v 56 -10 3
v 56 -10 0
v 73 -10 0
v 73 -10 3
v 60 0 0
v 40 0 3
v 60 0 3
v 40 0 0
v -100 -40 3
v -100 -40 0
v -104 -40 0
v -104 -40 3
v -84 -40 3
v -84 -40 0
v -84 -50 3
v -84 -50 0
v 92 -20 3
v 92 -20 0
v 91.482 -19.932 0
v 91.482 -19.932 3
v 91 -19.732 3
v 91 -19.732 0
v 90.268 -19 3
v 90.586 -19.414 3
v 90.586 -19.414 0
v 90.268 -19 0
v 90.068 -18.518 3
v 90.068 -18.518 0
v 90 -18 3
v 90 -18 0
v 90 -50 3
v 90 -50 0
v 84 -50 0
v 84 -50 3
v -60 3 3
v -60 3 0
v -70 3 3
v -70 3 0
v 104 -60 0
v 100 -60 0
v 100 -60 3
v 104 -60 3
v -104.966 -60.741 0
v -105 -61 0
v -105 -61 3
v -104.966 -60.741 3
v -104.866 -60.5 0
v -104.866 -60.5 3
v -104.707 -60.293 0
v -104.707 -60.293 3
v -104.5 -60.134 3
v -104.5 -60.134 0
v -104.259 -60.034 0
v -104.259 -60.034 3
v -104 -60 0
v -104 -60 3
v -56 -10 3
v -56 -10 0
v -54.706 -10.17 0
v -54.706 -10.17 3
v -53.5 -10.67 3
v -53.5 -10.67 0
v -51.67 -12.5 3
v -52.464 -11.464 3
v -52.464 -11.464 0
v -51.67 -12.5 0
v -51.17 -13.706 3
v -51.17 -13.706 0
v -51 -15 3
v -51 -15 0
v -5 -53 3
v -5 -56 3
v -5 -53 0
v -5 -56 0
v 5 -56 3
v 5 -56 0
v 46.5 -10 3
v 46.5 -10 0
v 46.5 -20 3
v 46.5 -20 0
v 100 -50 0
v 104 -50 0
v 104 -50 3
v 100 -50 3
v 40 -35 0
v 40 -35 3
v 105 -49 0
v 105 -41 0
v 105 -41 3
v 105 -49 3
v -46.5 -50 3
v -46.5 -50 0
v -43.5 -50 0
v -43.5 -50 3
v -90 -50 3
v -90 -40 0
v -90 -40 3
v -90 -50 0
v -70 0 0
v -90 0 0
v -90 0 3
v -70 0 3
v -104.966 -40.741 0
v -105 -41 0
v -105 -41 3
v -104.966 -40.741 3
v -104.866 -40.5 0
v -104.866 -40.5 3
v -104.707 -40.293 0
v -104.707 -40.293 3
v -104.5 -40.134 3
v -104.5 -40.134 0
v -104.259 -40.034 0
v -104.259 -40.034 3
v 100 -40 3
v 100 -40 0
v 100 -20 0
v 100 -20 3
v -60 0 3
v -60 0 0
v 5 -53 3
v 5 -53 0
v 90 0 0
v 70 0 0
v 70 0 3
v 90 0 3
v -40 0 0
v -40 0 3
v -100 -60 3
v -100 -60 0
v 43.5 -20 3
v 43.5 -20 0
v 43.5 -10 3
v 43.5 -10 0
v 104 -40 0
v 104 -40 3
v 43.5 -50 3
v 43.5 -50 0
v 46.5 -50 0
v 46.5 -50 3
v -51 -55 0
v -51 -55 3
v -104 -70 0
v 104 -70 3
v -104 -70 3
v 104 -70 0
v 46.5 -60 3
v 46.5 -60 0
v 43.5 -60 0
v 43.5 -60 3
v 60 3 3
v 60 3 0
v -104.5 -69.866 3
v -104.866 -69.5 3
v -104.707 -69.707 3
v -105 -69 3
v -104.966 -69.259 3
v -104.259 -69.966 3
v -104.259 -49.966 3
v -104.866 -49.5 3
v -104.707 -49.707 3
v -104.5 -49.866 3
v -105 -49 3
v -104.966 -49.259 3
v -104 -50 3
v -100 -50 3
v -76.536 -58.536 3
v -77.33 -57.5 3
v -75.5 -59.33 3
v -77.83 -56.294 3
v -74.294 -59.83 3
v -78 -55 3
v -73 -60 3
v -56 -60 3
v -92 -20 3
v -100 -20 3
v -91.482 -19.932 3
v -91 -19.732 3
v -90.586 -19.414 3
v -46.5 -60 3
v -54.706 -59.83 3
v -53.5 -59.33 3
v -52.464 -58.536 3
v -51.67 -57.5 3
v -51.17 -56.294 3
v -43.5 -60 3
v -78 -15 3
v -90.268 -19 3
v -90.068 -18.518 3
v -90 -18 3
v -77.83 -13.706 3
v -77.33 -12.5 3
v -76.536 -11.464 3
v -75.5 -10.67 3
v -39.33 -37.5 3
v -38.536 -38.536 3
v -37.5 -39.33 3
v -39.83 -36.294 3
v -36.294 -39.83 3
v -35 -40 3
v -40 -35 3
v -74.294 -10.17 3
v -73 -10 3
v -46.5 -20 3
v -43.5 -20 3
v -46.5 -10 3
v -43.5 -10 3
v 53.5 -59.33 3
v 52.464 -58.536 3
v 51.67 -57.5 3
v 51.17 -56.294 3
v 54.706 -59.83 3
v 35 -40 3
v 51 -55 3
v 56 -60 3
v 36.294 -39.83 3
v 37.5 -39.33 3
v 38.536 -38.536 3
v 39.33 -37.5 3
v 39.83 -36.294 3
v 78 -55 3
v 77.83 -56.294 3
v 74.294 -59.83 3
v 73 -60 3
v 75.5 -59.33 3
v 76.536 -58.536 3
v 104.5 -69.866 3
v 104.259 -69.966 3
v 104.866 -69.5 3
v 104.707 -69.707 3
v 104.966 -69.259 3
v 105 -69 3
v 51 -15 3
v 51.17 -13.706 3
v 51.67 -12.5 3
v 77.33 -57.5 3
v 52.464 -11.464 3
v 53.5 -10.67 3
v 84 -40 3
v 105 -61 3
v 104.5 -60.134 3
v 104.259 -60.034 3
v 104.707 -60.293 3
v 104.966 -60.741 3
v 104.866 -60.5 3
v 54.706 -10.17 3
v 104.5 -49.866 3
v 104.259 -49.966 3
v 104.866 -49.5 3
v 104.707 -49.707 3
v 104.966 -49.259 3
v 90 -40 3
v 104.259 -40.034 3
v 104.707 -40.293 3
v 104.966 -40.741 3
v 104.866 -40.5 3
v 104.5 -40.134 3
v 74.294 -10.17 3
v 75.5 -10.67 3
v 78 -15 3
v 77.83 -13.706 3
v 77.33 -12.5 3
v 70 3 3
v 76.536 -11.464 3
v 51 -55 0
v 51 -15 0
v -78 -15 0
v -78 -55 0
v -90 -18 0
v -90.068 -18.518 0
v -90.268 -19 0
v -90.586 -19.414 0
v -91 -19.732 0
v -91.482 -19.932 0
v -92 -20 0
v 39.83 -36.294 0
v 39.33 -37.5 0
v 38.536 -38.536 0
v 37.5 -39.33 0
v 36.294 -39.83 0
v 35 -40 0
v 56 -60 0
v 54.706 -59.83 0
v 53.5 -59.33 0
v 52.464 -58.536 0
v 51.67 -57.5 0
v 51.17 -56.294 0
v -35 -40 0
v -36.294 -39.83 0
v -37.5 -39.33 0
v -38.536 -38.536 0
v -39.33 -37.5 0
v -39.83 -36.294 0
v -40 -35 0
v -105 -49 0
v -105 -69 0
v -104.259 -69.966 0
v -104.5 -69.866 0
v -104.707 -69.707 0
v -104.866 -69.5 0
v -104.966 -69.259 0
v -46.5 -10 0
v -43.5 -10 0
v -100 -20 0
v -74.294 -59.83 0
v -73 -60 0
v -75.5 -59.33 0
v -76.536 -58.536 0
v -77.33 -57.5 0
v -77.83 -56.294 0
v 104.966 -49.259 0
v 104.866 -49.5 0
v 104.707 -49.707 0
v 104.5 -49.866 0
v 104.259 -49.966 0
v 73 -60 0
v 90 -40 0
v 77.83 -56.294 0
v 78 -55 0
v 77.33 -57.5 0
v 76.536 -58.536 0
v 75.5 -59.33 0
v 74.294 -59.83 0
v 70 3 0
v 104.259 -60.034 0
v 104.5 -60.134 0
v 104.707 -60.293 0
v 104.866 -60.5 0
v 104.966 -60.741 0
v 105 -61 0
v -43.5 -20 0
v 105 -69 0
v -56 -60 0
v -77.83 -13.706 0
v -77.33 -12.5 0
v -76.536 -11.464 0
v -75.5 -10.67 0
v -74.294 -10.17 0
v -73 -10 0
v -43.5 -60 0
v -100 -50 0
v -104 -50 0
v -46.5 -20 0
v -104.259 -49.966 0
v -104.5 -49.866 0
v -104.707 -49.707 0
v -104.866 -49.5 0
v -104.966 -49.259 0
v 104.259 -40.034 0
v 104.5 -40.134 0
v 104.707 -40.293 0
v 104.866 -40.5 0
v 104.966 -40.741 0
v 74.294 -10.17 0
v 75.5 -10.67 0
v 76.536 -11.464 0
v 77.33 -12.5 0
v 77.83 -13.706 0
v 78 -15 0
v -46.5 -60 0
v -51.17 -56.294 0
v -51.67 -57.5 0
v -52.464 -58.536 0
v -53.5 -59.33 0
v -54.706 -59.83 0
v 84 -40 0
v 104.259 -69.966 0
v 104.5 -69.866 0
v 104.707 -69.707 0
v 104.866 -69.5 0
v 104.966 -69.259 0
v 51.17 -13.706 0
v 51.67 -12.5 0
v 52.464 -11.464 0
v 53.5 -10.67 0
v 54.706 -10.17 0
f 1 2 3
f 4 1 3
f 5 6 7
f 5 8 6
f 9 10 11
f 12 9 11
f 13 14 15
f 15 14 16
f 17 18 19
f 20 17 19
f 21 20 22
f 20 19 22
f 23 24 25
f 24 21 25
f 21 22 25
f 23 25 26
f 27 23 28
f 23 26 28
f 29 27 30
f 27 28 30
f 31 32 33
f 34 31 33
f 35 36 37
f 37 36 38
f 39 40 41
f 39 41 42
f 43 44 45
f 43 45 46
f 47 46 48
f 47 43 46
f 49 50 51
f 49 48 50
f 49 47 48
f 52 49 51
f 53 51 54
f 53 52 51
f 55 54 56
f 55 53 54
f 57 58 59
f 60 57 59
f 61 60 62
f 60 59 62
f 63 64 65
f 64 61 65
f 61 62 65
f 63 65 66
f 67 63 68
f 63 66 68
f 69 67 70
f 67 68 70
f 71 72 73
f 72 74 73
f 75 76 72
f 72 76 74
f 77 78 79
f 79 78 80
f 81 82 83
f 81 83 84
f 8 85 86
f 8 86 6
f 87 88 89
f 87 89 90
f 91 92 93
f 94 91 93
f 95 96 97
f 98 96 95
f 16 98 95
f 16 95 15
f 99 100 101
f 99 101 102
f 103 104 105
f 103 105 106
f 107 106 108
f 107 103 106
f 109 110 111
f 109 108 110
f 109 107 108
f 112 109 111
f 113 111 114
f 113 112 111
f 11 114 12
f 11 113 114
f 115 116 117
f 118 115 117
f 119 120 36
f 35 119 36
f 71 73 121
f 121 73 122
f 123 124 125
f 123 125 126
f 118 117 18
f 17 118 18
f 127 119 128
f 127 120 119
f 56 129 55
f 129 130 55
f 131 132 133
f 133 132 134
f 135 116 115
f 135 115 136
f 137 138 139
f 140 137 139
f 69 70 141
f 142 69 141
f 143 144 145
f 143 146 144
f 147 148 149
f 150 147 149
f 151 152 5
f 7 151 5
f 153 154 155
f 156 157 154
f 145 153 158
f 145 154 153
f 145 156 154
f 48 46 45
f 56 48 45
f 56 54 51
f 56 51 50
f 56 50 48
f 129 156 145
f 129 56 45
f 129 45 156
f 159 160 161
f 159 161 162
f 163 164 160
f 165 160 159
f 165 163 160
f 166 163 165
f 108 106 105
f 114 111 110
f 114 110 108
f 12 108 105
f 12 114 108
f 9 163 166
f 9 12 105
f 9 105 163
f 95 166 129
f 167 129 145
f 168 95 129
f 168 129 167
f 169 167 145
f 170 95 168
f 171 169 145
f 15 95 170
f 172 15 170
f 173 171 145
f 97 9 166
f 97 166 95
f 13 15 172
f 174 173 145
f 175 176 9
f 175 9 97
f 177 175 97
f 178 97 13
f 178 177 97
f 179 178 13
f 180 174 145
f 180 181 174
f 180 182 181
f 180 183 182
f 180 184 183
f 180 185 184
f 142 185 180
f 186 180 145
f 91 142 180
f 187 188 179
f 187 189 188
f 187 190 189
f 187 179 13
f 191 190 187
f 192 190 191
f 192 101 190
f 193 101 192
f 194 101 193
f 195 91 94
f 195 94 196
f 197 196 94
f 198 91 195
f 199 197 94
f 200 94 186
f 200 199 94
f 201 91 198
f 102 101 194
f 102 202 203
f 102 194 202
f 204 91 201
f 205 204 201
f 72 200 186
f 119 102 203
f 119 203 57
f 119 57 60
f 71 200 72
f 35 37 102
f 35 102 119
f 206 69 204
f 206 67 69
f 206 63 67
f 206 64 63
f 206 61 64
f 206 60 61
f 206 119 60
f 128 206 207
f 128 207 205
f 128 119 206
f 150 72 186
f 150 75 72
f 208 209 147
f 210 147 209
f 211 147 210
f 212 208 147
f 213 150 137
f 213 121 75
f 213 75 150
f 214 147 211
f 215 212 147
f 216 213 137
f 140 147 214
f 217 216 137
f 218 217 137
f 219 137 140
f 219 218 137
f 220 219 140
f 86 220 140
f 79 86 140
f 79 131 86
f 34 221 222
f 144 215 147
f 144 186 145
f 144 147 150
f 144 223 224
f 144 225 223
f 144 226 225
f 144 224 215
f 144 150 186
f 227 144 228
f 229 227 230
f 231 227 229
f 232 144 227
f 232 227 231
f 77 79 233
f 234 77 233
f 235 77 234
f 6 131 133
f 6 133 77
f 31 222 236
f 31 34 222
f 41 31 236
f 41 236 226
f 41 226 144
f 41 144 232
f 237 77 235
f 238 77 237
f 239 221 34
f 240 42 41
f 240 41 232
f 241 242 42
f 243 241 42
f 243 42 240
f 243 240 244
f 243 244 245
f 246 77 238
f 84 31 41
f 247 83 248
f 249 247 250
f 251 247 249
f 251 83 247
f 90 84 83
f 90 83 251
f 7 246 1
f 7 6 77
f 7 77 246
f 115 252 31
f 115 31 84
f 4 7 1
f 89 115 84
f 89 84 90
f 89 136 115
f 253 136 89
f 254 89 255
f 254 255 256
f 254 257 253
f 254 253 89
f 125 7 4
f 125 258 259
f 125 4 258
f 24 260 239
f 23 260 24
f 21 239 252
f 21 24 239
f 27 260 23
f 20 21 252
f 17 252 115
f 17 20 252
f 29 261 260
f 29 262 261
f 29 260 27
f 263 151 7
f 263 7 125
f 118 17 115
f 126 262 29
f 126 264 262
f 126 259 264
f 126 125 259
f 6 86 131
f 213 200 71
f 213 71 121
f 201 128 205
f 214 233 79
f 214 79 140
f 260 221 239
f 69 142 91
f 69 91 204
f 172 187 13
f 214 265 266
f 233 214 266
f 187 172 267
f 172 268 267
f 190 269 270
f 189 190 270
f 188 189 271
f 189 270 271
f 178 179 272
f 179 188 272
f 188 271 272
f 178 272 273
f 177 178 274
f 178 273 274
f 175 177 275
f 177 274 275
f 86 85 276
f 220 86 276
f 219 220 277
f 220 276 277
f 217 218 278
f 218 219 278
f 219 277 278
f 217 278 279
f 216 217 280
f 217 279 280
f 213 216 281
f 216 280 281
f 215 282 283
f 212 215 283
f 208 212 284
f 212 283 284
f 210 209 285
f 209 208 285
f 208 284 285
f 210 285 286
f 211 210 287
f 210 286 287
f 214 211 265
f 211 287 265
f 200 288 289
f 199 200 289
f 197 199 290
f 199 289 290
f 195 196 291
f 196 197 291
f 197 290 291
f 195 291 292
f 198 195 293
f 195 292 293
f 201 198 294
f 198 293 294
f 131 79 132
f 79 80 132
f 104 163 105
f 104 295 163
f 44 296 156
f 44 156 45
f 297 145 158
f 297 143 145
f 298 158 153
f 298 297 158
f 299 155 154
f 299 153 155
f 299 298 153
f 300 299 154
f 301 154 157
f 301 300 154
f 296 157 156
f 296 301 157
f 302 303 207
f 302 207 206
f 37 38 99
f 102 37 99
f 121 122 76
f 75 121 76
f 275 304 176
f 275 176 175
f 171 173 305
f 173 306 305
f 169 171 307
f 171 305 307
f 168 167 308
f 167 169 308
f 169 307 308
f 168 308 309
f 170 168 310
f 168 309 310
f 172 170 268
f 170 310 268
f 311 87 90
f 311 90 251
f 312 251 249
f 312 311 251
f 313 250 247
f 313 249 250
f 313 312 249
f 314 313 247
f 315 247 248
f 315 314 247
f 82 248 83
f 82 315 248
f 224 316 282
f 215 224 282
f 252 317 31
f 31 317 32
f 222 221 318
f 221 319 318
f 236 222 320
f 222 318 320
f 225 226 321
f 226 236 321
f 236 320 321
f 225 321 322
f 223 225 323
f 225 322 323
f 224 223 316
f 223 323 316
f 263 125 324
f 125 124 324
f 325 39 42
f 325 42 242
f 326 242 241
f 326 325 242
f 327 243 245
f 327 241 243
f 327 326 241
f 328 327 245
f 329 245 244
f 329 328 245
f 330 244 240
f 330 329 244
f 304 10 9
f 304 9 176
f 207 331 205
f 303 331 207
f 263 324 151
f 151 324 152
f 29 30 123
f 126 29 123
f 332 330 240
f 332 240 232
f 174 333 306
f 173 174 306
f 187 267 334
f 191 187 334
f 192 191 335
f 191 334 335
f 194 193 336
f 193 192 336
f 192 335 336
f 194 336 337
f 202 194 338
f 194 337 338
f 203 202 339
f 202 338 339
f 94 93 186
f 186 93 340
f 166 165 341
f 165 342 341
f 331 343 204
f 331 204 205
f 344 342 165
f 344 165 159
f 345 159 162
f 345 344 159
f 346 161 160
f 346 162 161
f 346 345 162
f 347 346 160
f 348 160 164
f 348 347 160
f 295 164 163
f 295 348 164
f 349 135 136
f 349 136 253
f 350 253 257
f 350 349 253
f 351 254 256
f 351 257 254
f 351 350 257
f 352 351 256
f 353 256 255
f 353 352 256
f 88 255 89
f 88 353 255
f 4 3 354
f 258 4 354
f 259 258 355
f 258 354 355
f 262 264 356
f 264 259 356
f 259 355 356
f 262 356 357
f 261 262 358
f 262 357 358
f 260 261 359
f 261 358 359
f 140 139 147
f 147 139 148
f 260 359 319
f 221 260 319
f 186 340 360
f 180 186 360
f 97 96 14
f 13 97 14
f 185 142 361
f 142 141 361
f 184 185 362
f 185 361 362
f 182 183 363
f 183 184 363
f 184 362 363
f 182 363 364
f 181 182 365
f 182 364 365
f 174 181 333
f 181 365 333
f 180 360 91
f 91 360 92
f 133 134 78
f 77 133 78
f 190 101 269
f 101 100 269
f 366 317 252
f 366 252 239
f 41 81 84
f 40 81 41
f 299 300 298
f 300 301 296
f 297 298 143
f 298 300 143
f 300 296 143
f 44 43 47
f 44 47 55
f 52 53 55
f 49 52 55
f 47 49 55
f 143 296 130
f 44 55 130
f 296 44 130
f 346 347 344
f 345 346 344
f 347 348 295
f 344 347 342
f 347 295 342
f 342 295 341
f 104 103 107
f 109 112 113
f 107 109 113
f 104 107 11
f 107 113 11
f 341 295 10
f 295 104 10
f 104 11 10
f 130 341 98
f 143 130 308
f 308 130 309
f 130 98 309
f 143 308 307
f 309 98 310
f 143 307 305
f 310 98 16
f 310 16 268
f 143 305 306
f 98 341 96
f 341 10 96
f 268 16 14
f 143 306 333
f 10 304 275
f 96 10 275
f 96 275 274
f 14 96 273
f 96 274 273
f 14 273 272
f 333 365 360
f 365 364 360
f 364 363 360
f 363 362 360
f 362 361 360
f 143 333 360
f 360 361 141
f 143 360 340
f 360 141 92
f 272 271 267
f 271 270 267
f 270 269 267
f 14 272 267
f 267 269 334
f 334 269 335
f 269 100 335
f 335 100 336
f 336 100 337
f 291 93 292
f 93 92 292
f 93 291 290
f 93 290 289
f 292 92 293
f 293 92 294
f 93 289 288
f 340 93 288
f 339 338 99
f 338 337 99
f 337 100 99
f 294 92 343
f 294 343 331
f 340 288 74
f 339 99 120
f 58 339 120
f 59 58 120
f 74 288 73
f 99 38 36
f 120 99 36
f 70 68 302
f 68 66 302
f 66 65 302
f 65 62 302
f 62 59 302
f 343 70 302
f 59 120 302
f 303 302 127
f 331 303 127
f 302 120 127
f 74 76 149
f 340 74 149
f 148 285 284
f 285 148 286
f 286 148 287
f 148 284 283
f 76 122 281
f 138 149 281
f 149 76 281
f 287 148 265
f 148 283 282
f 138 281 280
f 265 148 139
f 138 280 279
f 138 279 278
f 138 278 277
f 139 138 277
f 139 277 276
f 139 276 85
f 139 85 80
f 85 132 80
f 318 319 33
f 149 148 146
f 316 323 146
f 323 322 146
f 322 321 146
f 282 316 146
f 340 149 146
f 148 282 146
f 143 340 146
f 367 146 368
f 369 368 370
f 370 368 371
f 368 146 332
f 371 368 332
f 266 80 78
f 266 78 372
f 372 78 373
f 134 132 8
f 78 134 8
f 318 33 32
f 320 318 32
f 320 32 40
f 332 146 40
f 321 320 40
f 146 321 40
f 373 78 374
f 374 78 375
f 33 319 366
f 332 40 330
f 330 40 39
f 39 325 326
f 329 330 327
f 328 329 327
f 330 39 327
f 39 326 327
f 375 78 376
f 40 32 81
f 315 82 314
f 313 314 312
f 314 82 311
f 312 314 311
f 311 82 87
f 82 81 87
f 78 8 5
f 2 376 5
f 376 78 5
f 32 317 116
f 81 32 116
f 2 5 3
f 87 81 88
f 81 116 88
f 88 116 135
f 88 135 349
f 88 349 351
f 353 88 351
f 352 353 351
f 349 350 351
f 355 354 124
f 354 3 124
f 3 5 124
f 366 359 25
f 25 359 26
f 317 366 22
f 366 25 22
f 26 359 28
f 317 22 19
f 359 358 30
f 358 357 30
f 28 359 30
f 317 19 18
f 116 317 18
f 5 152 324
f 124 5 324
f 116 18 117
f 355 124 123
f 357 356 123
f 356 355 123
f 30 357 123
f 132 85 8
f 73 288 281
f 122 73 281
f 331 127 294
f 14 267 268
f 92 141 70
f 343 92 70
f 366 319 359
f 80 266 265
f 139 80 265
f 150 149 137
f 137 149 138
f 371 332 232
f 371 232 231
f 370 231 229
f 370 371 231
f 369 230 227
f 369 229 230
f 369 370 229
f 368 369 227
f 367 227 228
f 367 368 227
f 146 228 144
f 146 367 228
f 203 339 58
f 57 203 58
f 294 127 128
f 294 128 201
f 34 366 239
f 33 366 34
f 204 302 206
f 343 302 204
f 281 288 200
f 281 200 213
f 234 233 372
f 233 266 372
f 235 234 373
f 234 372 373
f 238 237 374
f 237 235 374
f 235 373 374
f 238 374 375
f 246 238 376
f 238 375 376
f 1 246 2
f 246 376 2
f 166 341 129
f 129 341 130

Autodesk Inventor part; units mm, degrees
ref_plane "YZ Plane" through (0, 0, 0) normal (1, 0, 0) x (0, 1, 0)
ref_plane "XZ Plane" through (0, 0, 0) normal (0, 1, 0) x (-1, 0, 0)
ref_plane "XY Plane" through (0, 0, 0) normal (0, 0, 1) x (1, 0, 0)
sketch "Sketch1" plane through (0, 0, 0) normal (0, 0, 1) x (1, 0, 0)
  line L0 (-40, 0) -> (-40, -35)
  line L1 (-35, -40) -> (35, -40)
  line L2 (40, -35) -> (40, 0)
  line L3 (104, -70) -> (-104, -70)
  line L4 (-60, 0) -> (-60, 3)
  line L5 (-60, 3) -> (-70, 3)
  line L6 (-70, 3) -> (-70, 0)
  line L7 (-90, 0) -> (-70, 0)
  line L8 (-60, 0) -> (-40, 0)
  line L9 (70, 0) -> (70, 3)
  line L10 (70, 3) -> (60, 3)
  line L11 (60, 3) -> (60, 0)
  line L12 (40, 0) -> (60, 0)
  line L13 (70, 0) -> (90, 0)
  arc A0 (-105, -69) -> (-104, -70) centre (-104, -69) ccw
  arc A1 (104, -70) -> (105, -69) centre (104, -69) ccw
  line L14 (-90, -40) -> (-84, -40)
  line L15 (-84, -40) -> (-84, -50)
  line L16 (90, -40) -> (84, -40)
  line L17 (84, -40) -> (84, -50)
  line L18 (-43.5, -10) -> (-46.5, -10)
  line L19 (-46.5, -10) -> (-46.5, -20)
  line L20 (-46.5, -20) -> (-43.5, -20)
  line L21 (-43.5, -20) -> (-43.5, -10)
  line L22 (43.5, -10) -> (46.5, -10)
  line L23 (46.5, -10) -> (46.5, -20)
  line L24 (46.5, -20) -> (43.5, -20)
  line L25 (43.5, -20) -> (43.5, -10)
  line L26 (-46.5, -50) -> (-43.5, -50)
  line L27 (-43.5, -50) -> (-43.5, -60)
  line L28 (-43.5, -60) -> (-46.5, -60)
  line L29 (-46.5, -60) -> (-46.5, -50)
  line L30 (43.5, -50) -> (46.5, -50)
  line L31 (46.5, -50) -> (46.5, -60)
  line L32 (46.5, -60) -> (43.5, -60)
  line L33 (43.5, -60) -> (43.5, -50)
  line L34 (-5, -53) -> (5, -53)
  line L35 (5, -53) -> (5, -56)
  line L36 (5, -56) -> (-5, -56)
  line L37 (-5, -56) -> (-5, -53)
  line L38 (-100, -40) -> (-100, -20)
  line L39 (-100, -20) -> (-92, -20)
  line L40 (-90, -40) -> (-90, -50)
  line L41 (90, -40) -> (90, -50)
  line L42 (90, -50) -> (84, -50)
  line L43 (100, -40) -> (100, -20)
  line L44 (100, -20) -> (92, -20)
  line L45 (90, -18) -> (90, 0)
  line L46 (-90, 0) -> (-90, -18)
  arc A2 (-92, -20) -> (-90, -18) centre (-92, -18) ccw
  arc A3 (90, -18) -> (92, -20) centre (92, -18) ccw
  line L47 (-90, -50) -> (-84, -50)
  line L48 (-100, -40) -> (-104, -40)
  line L49 (100, -40) -> (104, -40)
  arc A4 (-104, -40) -> (-105, -41) centre (-104, -41) ccw
  arc A5 (105, -41) -> (104, -40) centre (104, -41) ccw
  line L50 (-104, -50) -> (-100, -50)
  line L51 (-100, -50) -> (-100, -60)
  line L52 (-100, -60) -> (-104, -60)
  line L53 (-105, -69) -> (-105, -61)
  line L54 (-105, -49) -> (-105, -41)
  arc A6 (-104, -60) -> (-105, -61) centre (-104, -61) ccw
  arc A7 (-105, -49) -> (-104, -50) centre (-104, -49) ccw
  line L55 (104, -50) -> (100, -50)
  line L56 (100, -50) -> (100, -60)
  line L57 (100, -60) -> (104, -60)
  line L58 (105, -41) -> (105, -49)
  line L59 (105, -61) -> (105, -69)
  arc A8 (105, -61) -> (104, -60) centre (104, -61) ccw
  arc A9 (104, -50) -> (105, -49) centre (104, -49) ccw
  arc A10 (-40, -35) -> (-35, -40) centre (-35, -35) ccw
  arc A11 (35, -40) -> (40, -35) centre (35, -35) ccw
  line L60 (-73, -10) -> (-56, -10)
  line L61 (-51, -15) -> (-51, -55)
  line L62 (-56, -60) -> (-73, -60)
  line L63 (-78, -55) -> (-78, -15)
  line L64 (56, -10) -> (73, -10)
  line L65 (78, -15) -> (78, -55)
  line L66 (73, -60) -> (56, -60)
  line L67 (51, -55) -> (51, -15)
  arc A12 (-73, -10) -> (-78, -15) centre (-73, -15) ccw
  arc A13 (-51, -15) -> (-56, -10) centre (-56, -15) ccw
  arc A14 (-56, -60) -> (-51, -55) centre (-56, -55) ccw
  arc A15 (-78, -55) -> (-73, -60) centre (-73, -55) ccw
  arc A16 (56, -10) -> (51, -15) centre (56, -15) ccw
  arc A17 (78, -15) -> (73, -10) centre (73, -15) ccw
  arc A18 (73, -60) -> (78, -55) centre (73, -55) ccw
  arc A19 (51, -55) -> (56, -60) centre (56, -55) ccw
  point P0 (0, 0)
  point P1 (105, -70)
  point P2 (-105, -70)
  point P3 (-90, -20)
  point P4 (90, -20)
  point P5 (-105, -40)
  point P6 (105, -50)
  point P7 (-40, -40)
  point P8 (40, -40)
  dimension "d0" = 80
  dimension "d1" = 40
  dimension "d2" = 50
  dimension "d10" = 50
  dimension "d15" = 3
  dimension "d16" = 10
  dimension "d18" = 10
  dimension "d20" = 3
  dimension "d23" = 40
  dimension "d24" = 40
  dimension "d27" = 1
  dimension "d28" = 10
  dimension "d29" = 6
  dimension "d31" = 40
  dimension "d32" = 10
  dimension "d33" = 6
  dimension "d35" = 40
  dimension "d39" = 10
  dimension "d40" = 3
  dimension "d41" = 10
  dimension "d42" = 3
  dimension "d44" = 10
  dimension "d45" = 10
  dimension "d50" = 3
  dimension "d51" = 10
  dimension "d52" = 10
  dimension "d54" = 3
  dimension "d55" = 10
  dimension "d56" = 10
  dimension "d60" = 10
  dimension "d61" = 3
  dimension "d62" = 17
  dimension "d66" = 40
  dimension "d67" = 40
  dimension "d71" = 3.5
  dimension "d72" = 3.5
  dimension "d73" = 3.5
  dimension "d74" = 3.5
  dimension "d77" = 20
  dimension "d78" = 20
  dimension "d79" = 10
  dimension "d80" = 10
  dimension "d81" = 2
  dimension "d82" = 10
  dimension "d84" = 50
  dimension "d85" = 20
  dimension "d86" = 20
  dimension "d87" = 60
  dimension "d88" = 5
  dimension "d92" = 30
  dimension "d93" = 5
  dimension "d94" = 30
  dimension "d95" = 1
  dimension "d97" = 10
  dimension "d98" = 10
  dimension "d99" = 1
  dimension "d100" = 10
  dimension "d101" = 10
  dimension "d102" = 5
  dimension "d103" = 5
  dimension "d104" = 210
  dimension "d105" = 1
  dimension "d106" = 5
  dimension "d107" = 70
extrude "Extrusion8" add sketch "Sketch1" along normal blind 3
properties part number "Bulkhead 25083113"
